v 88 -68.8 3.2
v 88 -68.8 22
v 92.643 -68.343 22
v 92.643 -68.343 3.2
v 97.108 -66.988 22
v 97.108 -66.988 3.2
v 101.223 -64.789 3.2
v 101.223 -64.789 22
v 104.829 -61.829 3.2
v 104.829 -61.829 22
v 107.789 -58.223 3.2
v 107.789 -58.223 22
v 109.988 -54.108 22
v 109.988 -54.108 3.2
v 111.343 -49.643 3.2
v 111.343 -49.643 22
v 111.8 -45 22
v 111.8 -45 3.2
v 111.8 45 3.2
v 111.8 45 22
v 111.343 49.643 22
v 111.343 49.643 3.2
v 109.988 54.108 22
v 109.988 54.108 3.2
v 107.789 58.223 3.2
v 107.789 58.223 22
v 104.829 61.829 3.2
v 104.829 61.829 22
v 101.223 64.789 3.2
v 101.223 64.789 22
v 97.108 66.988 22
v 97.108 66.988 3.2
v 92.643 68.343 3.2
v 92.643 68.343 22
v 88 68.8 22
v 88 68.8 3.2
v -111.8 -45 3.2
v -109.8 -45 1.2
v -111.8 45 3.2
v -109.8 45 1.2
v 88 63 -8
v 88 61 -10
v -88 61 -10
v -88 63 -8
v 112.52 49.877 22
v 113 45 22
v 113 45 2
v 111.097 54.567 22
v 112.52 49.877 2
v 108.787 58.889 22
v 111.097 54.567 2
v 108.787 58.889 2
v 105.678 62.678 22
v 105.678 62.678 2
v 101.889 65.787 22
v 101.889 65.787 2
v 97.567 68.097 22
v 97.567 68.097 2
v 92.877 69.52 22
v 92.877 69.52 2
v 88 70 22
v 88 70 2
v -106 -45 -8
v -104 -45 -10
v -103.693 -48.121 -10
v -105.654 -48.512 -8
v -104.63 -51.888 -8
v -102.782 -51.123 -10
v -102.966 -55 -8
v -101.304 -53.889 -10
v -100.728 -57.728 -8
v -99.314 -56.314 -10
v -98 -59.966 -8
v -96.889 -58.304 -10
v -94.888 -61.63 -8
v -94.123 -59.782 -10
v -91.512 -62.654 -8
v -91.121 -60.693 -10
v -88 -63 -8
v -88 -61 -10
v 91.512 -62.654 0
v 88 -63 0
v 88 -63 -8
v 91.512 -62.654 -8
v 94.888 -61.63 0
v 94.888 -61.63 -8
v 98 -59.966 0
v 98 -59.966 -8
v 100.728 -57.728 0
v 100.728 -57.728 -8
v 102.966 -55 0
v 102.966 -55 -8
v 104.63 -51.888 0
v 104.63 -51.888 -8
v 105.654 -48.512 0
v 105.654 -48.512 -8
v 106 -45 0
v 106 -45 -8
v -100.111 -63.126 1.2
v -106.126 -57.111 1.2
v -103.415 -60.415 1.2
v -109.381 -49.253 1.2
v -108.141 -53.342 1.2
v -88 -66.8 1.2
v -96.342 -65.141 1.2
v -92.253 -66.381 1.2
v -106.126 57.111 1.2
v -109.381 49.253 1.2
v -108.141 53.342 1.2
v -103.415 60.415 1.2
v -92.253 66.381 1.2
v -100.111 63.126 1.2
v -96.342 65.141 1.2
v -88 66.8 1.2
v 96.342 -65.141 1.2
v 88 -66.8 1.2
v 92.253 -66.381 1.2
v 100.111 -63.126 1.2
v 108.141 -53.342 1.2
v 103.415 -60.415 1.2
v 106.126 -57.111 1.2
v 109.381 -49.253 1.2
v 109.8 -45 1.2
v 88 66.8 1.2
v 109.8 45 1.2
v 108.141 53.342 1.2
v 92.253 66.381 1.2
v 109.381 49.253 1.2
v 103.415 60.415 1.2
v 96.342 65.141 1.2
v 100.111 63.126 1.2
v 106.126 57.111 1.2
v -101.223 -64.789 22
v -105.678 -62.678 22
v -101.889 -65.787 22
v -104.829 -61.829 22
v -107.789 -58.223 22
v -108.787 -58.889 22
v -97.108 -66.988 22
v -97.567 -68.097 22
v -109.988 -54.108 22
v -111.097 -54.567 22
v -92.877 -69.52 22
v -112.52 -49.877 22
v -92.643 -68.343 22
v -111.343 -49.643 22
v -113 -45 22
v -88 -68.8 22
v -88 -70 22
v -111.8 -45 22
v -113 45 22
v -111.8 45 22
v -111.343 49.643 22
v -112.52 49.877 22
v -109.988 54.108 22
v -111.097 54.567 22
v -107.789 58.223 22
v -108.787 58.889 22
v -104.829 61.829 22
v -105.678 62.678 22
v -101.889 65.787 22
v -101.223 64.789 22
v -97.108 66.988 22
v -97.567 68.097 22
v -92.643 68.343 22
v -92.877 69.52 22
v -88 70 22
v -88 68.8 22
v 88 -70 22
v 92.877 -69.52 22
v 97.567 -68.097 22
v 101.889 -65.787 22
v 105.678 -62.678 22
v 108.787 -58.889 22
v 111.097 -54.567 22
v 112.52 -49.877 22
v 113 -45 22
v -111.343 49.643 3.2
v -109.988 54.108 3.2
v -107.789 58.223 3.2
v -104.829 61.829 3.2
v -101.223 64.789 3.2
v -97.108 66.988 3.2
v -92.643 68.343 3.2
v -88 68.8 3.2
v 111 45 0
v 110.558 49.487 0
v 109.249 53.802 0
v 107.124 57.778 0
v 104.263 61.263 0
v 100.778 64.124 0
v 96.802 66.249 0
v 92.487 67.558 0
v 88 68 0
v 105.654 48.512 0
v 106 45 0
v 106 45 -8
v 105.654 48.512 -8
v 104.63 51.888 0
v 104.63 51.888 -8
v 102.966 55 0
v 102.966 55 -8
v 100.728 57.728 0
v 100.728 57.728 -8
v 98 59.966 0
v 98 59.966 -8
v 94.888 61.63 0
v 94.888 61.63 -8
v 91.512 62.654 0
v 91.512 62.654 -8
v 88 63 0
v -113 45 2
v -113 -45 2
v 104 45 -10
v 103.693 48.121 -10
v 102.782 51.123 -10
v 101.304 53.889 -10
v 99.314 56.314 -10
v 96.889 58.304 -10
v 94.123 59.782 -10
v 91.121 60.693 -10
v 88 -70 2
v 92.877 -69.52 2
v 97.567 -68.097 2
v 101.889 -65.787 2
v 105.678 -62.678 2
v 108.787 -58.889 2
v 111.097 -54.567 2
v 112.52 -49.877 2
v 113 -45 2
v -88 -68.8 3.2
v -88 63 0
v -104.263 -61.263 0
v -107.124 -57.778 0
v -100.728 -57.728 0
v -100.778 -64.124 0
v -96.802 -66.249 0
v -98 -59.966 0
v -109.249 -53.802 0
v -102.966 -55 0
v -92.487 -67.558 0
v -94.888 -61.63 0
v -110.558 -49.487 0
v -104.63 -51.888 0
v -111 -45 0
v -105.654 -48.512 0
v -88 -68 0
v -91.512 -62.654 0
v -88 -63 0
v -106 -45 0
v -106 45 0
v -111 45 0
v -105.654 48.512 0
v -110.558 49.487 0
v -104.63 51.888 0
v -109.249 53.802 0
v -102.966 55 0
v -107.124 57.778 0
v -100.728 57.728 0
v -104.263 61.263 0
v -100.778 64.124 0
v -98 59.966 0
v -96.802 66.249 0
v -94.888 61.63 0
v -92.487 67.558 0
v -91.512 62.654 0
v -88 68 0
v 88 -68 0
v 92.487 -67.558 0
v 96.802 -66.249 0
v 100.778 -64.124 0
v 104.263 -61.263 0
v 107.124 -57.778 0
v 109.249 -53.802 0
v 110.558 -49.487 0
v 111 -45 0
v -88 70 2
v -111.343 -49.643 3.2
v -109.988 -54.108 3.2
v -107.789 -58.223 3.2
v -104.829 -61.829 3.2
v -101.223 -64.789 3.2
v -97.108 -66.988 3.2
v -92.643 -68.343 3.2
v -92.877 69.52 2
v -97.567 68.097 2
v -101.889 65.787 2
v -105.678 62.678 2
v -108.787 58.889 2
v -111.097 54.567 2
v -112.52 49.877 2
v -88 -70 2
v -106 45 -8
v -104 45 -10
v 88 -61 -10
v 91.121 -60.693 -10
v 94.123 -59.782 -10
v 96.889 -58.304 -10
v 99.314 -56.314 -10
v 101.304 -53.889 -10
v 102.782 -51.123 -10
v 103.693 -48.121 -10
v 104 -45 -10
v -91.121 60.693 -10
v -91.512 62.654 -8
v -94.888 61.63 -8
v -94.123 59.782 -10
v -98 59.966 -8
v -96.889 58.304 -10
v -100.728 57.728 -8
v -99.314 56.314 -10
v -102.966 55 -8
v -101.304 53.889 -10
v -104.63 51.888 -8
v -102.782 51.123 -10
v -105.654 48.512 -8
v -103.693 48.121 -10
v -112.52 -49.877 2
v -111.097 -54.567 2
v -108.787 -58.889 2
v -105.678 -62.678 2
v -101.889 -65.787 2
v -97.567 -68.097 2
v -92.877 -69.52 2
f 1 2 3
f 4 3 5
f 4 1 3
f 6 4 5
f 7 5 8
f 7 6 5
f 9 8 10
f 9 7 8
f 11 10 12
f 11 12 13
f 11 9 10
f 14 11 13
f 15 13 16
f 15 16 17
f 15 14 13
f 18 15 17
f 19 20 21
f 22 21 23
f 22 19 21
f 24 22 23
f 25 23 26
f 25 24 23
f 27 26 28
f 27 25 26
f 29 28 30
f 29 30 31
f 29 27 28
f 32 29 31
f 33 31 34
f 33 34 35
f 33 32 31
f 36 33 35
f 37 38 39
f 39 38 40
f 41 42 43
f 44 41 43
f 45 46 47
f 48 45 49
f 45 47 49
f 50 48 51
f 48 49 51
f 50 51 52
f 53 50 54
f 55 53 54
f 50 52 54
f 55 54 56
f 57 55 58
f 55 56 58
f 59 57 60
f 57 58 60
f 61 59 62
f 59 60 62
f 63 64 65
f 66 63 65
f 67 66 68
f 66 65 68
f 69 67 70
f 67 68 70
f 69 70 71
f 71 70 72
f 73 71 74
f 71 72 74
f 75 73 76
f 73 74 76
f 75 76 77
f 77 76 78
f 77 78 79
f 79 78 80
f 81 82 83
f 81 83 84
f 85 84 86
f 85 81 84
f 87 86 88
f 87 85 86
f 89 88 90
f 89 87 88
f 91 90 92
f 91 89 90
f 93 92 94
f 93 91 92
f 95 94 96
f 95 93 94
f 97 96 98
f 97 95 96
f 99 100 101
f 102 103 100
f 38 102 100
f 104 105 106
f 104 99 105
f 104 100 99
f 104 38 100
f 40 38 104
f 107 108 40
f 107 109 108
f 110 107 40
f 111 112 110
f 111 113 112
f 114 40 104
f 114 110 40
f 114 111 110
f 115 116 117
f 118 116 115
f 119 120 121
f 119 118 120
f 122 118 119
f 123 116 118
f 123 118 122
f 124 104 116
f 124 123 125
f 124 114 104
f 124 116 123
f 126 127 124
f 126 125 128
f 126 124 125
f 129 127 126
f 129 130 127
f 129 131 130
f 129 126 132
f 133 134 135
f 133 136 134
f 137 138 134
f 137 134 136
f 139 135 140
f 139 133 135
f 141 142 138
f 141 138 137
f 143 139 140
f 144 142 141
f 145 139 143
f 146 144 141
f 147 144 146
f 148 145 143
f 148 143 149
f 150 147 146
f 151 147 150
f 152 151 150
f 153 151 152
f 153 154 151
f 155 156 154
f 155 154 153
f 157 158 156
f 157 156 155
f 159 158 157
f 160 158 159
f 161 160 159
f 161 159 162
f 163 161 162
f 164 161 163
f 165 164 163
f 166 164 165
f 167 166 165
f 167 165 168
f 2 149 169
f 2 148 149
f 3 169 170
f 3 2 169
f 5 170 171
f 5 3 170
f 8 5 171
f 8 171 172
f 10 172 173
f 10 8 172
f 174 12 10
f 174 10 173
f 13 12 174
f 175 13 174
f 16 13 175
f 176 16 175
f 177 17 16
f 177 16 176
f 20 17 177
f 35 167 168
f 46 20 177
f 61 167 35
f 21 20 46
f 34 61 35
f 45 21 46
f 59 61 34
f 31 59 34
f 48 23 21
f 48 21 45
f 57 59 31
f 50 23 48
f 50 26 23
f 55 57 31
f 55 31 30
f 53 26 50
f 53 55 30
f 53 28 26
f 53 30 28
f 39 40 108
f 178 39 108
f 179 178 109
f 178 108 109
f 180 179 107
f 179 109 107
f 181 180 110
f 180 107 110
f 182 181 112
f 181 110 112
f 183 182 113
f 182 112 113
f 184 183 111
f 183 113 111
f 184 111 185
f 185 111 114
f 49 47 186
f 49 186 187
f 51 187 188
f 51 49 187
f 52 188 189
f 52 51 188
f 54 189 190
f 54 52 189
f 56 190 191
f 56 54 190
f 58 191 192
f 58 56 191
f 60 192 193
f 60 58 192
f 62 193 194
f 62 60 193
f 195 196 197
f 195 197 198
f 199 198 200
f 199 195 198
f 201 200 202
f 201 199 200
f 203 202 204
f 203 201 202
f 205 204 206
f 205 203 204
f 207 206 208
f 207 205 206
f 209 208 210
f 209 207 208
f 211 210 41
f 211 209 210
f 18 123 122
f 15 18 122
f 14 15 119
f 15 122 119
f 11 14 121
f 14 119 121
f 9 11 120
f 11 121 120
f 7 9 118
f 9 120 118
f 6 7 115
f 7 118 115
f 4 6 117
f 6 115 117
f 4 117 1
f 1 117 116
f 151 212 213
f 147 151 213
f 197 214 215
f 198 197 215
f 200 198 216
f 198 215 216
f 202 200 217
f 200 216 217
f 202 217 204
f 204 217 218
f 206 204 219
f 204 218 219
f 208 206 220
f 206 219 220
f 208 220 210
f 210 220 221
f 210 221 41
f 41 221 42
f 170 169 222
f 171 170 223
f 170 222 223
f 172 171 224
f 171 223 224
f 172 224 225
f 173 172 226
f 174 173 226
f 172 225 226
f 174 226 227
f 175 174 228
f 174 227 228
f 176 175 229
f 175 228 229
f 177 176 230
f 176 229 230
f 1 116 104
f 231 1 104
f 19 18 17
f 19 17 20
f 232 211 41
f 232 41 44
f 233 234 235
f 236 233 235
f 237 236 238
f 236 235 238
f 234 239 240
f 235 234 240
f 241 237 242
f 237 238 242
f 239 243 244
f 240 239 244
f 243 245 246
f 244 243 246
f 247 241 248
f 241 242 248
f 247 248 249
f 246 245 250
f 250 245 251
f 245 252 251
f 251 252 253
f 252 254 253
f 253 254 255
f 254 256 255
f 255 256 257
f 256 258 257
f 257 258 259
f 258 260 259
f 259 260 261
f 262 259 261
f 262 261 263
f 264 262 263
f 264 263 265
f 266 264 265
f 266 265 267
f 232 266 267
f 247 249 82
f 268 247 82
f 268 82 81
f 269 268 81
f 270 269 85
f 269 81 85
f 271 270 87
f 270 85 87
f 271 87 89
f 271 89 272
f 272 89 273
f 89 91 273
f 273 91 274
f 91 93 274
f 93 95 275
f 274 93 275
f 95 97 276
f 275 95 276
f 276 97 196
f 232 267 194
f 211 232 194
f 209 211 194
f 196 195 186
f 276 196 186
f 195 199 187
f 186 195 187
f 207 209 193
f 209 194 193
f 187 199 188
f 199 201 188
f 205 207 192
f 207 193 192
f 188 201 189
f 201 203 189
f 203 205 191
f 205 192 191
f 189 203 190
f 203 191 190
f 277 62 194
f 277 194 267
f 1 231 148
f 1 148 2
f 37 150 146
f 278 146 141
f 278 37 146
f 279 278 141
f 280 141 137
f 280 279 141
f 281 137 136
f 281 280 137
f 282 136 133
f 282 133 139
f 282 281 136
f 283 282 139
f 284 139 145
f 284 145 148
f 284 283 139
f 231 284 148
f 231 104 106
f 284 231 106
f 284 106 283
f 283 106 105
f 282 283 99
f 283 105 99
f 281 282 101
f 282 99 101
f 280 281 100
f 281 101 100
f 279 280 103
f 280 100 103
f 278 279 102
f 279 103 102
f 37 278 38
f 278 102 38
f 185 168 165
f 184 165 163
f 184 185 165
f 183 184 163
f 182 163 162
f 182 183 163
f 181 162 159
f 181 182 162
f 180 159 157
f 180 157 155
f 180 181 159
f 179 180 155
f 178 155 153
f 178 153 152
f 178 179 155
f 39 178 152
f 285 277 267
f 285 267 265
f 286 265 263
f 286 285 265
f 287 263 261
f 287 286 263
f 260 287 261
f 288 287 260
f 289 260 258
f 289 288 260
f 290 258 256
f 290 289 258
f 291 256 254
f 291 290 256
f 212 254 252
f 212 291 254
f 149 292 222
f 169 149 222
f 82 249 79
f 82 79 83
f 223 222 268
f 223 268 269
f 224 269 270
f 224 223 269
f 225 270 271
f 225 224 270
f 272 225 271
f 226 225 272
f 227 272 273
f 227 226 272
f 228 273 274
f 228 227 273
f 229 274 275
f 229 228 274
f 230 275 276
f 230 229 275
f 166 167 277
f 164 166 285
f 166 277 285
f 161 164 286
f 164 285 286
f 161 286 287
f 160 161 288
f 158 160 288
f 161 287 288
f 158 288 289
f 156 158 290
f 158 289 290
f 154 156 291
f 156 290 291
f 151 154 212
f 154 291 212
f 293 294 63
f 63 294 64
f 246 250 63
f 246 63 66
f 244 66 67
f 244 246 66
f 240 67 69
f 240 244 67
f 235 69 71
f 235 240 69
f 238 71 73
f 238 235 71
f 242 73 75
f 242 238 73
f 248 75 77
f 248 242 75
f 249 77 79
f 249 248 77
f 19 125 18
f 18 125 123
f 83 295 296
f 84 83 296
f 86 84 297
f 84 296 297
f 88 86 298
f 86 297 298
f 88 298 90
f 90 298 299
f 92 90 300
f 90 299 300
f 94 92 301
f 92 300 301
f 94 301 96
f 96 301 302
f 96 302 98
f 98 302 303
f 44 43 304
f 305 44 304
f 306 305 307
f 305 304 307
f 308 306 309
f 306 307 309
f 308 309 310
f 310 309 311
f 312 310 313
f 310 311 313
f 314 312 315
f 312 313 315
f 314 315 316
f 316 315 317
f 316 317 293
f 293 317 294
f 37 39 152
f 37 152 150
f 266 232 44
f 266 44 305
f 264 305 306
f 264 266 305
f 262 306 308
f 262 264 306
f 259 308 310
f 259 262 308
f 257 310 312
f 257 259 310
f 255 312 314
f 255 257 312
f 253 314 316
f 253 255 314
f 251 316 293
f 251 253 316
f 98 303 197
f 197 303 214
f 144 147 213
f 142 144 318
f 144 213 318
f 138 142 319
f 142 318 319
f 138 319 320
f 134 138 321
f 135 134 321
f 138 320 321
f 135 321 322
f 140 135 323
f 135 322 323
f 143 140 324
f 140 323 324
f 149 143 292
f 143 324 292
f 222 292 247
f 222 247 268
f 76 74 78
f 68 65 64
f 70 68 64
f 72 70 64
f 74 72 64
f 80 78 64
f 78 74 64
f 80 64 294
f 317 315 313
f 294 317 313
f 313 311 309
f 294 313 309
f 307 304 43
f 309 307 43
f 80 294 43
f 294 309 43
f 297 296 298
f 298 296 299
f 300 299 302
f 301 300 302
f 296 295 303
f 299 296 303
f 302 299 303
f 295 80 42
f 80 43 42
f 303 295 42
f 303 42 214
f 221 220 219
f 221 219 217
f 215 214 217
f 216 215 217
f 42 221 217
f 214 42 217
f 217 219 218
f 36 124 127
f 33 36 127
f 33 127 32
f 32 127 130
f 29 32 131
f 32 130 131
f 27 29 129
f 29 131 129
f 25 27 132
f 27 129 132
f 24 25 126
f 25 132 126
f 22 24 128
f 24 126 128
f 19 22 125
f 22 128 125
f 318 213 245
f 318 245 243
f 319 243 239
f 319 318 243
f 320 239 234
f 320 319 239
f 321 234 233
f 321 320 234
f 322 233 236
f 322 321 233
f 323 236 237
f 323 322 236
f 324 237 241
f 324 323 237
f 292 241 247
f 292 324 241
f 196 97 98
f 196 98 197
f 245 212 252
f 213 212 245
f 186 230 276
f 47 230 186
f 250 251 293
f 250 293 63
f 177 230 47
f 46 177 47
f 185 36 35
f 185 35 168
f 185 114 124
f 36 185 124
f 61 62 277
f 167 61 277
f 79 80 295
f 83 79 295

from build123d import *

# Parameters (mm, degrees)
F1_DEPTH = 22
F2_T     = -1.2
F3_DEPTH = 10
F4_SIZE  = 2
F5_SIZE  = 2


with BuildPart() as f1:
    # F0 (on Top) → F1 (new body)
    with BuildSketch(Plane.XY):
        with BuildLine():
            ThreePointArc((113, 45), (105.6776695297, 62.6776695297), (88, 70))
            Line((88, 70), (-88, 70))
            ThreePointArc((-88, 70), (-105.6776695297, 62.6776695297), (-113, 45))
            Line((-113, 45), (-113, -45))
            ThreePointArc((-113, -45), (-105.6776695297, -62.6776695297), (-88, -70))
            Line((-88, -70), (88, -70))
            ThreePointArc((88, -70), (105.6776695297, -62.6776695297), (113, -45))
            Line((113, -45), (113, 45))
        make_face()
        with BuildLine():
            ThreePointArc((106, -45), (100.7279220614, -57.7279220614), (88, -63))
            Line((88, -63), (-88, -63))
            ThreePointArc((-88, -63), (-100.7279220614, -57.7279220614), (-106, -45))
            Line((-106, -45), (-106, 45))
            ThreePointArc((-106, 45), (-100.7279220614, 57.7279220614), (-88, 63))
            Line((-88, 63), (88, 63))
            ThreePointArc((88, 63), (100.7279220614, 57.7279220614), (106, 45))
            Line((106, 45), (106, -45))
        make_face(mode=Mode.SUBTRACT)
        with BuildLine():
            Line((-88, -63), (88, -63))
            ThreePointArc((88, -63), (100.7279220614, -57.7279220614), (106, -45))
            Line((106, -45), (106, 45))
            ThreePointArc((106, 45), (100.7279220614, 57.7279220614), (88, 63))
            Line((88, 63), (-88, 63))
            ThreePointArc((-88, 63), (-100.7279220614, 57.7279220614), (-106, 45))
            Line((-106, 45), (-106, -45))
            ThreePointArc((-106, -45), (-100.7279220614, -57.7279220614), (-88, -63))
        make_face()
        with BuildLine():
            ThreePointArc((103.6, -45), (99.0308657865, -56.0308657865), (88, -60.6))
            Line((88, -60.6), (-88, -60.6))
            ThreePointArc((-88, -60.6), (-99.0308657865, -56.0308657865), (-103.6, -45))
            Line((-103.6, -45), (-103.6, 45))
            ThreePointArc((-103.6, 45), (-99.0308657865, 56.0308657865), (-88, 60.6))
            Line((-88, 60.6), (88, 60.6))
            ThreePointArc((88, 60.6), (99.0308657865, 56.0308657865), (103.6, 45))
            Line((103.6, 45), (103.6, -45))
        make_face(mode=Mode.SUBTRACT)
        with BuildLine():
            Line((-88, -60.6), (88, -60.6))
            ThreePointArc((88, -60.6), (99.0308657865, -56.0308657865), (103.6, -45))
            Line((103.6, -45), (103.6, 45))
            ThreePointArc((103.6, 45), (99.0308657865, 56.0308657865), (88, 60.6))
            Line((88, 60.6), (-88, 60.6))
            ThreePointArc((-88, 60.6), (-99.0308657865, 56.0308657865), (-103.6, 45))
            Line((-103.6, 45), (-103.6, -45))
            ThreePointArc((-103.6, -45), (-99.0308657865, -56.0308657865), (-88, -60.6))
        make_face()
    extrude(amount=F1_DEPTH)

    # F2
    f2_openings = [f1.faces().sort_by_distance(p)[0] for p in [
        (0, 0, 22),
    ]]
    offset(amount=F2_T, openings=f2_openings)

    # F0 (on Top) → F3 (join)
    with BuildSketch(Plane.XY):
        with BuildLine():
            Line((-88, -63), (88, -63))
            ThreePointArc((88, -63), (100.7279220614, -57.7279220614), (106, -45))
            Line((106, -45), (106, 45))
            ThreePointArc((106, 45), (100.7279220614, 57.7279220614), (88, 63))
            Line((88, 63), (-88, 63))
            ThreePointArc((-88, 63), (-100.7279220614, 57.7279220614), (-106, 45))
            Line((-106, 45), (-106, -45))
            ThreePointArc((-106, -45), (-100.7279220614, -57.7279220614), (-88, -63))
        make_face()
        with BuildLine():
            ThreePointArc((103.6, -45), (99.0308657865, -56.0308657865), (88, -60.6))
            Line((88, -60.6), (-88, -60.6))
            ThreePointArc((-88, -60.6), (-99.0308657865, -56.0308657865), (-103.6, -45))
            Line((-103.6, -45), (-103.6, 45))
            ThreePointArc((-103.6, 45), (-99.0308657865, 56.0308657865), (-88, 60.6))
            Line((-88, 60.6), (88, 60.6))
            ThreePointArc((88, 60.6), (99.0308657865, 56.0308657865), (103.6, 45))
            Line((103.6, 45), (103.6, -45))
        make_face(mode=Mode.SUBTRACT)
        with BuildLine():
            Line((-88, -60.6), (88, -60.6))
            ThreePointArc((88, -60.6), (99.0308657865, -56.0308657865), (103.6, -45))
            Line((103.6, -45), (103.6, 45))
            ThreePointArc((103.6, 45), (99.0308657865, 56.0308657865), (88, 60.6))
            Line((88, 60.6), (-88, 60.6))
            ThreePointArc((-88, 60.6), (-99.0308657865, 56.0308657865), (-103.6, 45))
            Line((-103.6, 45), (-103.6, -45))
            ThreePointArc((-103.6, -45), (-99.0308657865, -56.0308657865), (-88, -60.6))
        make_face()
    extrude(amount=-F3_DEPTH)

    # F4
    f4_edges = [f1.edges().sort_by_distance(p)[0] for p in [
        (0, -63, -10),
        (100.727922, -57.727922, -10),
        (106, 0, -10),
        (100.727922, 57.727922, -10),
        (0, 63, -10),
        (-100.727922, 57.727922, -10),
        (-106, 0, -10),
        (-100.727922, -57.727922, -10),
        (-113, 0, 0),
        (-105.67767, -62.67767, 0),
        (0, -70, 0),
        (-105.67767, 62.67767, 0),
        (0, 70, 0),
        (105.67767, 62.67767, 0),
        (105.67767, -62.67767, 0),
        (113, 0, 0),
    ]]
    chamfer(f4_edges, length=F4_SIZE)

    # F5
    f5_edges = [f1.edges().sort_by_distance(p)[0] for p in [
        (104.829141, 61.829141, 1.2),
        (0, 68.8, 1.2),
        (-104.829141, 61.829141, 1.2),
        (-111.8, 0, 1.2),
        (-104.829141, -61.829141, 1.2),
        (0, -68.8, 1.2),
        (104.829141, -61.829141, 1.2),
        (111.8, 0, 1.2),
    ]]
    chamfer(f5_edges, length=F5_SIZE)


solid = f1.part
